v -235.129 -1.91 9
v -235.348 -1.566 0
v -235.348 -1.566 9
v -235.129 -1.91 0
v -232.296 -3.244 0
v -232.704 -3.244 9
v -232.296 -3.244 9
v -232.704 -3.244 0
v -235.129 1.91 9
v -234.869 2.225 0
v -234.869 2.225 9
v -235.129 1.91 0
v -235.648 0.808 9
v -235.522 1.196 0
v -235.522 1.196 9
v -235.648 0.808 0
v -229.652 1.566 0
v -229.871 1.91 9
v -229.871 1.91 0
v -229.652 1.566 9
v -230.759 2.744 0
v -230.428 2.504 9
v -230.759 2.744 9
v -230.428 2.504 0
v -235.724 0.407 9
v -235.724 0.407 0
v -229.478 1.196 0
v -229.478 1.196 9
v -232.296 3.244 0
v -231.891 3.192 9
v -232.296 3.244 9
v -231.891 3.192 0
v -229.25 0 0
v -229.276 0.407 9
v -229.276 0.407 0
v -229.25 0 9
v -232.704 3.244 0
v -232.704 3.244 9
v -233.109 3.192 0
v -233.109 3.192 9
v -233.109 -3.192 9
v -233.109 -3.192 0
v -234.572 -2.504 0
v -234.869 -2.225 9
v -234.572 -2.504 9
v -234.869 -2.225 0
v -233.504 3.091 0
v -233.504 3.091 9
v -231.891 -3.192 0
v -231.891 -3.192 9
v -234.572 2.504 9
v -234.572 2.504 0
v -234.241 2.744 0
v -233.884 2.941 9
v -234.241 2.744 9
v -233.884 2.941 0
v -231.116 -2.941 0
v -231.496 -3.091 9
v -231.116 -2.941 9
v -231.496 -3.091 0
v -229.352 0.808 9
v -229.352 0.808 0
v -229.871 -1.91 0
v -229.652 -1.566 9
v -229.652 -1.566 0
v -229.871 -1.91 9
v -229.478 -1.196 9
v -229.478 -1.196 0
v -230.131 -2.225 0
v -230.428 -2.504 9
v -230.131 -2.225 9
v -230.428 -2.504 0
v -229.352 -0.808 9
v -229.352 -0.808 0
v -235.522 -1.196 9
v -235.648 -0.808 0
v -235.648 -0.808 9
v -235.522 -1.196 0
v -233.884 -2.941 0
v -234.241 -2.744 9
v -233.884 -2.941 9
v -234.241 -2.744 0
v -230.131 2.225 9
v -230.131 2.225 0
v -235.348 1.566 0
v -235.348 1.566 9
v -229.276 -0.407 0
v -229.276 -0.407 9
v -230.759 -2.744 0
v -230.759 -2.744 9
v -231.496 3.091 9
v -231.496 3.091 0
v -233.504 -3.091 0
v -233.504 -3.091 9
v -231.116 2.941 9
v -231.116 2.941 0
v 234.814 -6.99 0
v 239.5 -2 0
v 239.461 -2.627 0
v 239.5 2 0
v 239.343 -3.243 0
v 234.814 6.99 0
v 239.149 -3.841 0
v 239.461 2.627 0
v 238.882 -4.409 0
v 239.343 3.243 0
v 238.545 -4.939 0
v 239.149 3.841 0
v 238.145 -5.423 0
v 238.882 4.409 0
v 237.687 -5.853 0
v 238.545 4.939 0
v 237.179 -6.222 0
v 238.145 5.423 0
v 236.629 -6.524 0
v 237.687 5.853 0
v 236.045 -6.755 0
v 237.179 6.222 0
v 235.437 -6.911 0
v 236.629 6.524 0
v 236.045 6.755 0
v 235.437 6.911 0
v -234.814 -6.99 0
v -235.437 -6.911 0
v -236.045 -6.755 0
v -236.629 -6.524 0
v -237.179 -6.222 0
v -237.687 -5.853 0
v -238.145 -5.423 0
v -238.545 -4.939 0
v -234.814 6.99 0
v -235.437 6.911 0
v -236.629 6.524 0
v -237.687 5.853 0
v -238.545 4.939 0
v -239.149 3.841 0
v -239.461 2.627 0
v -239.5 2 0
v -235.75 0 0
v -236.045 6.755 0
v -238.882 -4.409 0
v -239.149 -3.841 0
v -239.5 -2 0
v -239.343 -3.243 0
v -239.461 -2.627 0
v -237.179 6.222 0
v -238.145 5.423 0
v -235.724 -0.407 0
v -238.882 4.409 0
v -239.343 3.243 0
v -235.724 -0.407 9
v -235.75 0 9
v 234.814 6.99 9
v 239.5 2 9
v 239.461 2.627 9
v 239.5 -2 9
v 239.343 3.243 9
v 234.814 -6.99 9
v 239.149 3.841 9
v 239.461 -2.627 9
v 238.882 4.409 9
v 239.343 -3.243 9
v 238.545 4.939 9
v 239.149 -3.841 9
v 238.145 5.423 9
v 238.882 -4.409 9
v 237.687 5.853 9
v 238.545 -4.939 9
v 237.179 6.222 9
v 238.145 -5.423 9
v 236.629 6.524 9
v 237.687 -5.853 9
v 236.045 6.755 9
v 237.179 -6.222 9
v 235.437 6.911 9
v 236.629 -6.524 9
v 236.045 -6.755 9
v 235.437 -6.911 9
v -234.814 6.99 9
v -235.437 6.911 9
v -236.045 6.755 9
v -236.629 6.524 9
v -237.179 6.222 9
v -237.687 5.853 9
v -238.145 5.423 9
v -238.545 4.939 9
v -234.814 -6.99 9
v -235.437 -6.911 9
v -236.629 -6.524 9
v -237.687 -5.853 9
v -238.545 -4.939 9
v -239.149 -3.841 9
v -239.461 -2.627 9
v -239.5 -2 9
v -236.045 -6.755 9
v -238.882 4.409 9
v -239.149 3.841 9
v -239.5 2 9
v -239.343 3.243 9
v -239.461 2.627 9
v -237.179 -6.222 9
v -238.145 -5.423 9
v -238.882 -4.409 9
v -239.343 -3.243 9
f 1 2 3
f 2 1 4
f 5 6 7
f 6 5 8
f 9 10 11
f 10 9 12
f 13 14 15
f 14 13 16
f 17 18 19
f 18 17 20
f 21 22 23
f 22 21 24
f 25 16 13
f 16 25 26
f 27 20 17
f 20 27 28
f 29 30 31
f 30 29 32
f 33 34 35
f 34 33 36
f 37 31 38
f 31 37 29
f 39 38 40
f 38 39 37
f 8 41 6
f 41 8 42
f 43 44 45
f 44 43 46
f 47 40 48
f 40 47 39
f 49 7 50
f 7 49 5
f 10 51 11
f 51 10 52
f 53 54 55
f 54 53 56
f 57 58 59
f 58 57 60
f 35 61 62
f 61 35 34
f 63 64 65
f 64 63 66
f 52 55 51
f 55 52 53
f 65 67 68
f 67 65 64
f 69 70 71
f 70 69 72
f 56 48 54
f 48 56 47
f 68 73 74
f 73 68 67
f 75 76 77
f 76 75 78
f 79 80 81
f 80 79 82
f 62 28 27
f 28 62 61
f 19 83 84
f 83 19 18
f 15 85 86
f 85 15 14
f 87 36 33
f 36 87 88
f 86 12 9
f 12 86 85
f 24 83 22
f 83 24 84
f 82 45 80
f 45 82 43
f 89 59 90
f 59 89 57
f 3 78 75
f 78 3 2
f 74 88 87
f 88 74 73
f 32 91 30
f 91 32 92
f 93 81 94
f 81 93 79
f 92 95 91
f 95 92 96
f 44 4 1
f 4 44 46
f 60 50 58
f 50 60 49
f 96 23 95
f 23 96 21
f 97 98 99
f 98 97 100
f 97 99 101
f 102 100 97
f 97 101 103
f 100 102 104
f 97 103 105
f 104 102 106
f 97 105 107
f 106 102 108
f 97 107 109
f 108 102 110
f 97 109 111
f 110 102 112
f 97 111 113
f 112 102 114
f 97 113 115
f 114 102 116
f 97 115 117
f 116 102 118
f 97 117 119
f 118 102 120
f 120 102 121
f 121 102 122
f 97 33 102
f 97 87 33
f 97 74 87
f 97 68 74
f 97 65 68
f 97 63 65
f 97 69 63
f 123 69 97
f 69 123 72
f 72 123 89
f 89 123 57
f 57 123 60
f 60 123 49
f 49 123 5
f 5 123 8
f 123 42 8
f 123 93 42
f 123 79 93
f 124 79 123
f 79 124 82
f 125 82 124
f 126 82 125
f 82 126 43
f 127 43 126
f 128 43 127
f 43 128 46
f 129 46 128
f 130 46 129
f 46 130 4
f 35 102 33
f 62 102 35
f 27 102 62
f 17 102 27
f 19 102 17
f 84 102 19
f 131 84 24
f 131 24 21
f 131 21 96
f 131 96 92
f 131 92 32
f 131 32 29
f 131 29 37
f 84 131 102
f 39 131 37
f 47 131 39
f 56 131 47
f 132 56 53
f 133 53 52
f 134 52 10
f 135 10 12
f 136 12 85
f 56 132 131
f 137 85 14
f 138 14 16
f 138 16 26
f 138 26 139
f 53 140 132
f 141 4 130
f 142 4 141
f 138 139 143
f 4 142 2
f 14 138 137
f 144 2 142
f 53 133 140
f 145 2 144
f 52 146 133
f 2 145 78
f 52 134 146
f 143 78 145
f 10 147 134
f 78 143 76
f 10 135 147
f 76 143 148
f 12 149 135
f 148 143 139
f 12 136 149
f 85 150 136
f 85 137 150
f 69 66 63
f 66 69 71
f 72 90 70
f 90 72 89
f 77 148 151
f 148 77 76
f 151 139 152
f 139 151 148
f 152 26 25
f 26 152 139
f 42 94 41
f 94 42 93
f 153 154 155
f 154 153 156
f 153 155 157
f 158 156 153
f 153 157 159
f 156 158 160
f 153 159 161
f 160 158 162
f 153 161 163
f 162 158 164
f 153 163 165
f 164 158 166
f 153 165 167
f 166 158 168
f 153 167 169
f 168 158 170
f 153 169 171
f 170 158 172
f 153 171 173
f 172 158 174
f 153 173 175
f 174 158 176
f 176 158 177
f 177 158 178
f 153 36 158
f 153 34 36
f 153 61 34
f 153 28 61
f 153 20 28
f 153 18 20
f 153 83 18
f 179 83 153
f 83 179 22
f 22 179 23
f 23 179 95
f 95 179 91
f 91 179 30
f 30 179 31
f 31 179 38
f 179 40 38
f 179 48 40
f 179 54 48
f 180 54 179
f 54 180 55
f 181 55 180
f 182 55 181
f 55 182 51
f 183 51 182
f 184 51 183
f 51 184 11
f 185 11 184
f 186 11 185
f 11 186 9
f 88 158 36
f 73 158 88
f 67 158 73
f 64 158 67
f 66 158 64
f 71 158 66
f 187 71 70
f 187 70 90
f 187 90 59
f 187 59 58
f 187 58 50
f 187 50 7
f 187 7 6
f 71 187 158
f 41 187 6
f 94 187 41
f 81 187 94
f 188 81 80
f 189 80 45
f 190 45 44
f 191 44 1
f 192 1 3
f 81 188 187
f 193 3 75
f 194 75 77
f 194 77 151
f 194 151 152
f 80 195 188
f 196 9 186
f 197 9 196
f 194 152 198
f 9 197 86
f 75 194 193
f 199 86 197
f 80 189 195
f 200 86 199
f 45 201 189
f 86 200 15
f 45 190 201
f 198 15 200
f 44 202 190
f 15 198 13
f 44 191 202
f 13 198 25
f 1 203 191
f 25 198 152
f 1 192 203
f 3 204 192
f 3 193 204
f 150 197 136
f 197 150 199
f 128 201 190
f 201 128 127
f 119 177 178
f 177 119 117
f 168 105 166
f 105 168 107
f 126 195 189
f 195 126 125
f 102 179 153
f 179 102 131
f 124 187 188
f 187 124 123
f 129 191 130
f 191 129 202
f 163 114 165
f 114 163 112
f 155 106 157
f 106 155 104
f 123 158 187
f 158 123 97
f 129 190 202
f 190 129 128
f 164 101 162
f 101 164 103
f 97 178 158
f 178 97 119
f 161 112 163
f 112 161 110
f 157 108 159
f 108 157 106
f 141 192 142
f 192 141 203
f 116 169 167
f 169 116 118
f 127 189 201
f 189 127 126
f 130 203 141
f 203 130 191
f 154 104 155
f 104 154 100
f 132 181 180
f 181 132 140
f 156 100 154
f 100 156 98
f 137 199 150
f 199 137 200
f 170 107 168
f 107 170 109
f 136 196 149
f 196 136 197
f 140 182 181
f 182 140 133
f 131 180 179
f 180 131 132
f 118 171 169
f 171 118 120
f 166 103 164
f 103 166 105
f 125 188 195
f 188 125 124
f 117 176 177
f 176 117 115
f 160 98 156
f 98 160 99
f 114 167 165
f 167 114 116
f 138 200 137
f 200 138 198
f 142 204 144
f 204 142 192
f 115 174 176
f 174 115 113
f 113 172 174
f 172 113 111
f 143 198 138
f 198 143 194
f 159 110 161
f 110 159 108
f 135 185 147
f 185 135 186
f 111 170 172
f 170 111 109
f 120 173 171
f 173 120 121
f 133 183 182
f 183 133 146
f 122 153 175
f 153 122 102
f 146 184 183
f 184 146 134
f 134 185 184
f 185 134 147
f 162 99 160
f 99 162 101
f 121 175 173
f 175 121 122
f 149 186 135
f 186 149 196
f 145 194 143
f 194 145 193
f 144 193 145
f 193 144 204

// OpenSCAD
$fn = 50;


difference() {
	union() {
		hull() {
			translate(v = [-234.5000000000, 2.0000000000, 0]) {
				cylinder(h = 9, r = 5);
			}
			translate(v = [234.5000000000, 2.0000000000, 0]) {
				cylinder(h = 9, r = 5);
			}
			translate(v = [-234.5000000000, -2.0000000000, 0]) {
				cylinder(h = 9, r = 5);
			}
			translate(v = [234.5000000000, -2.0000000000, 0]) {
				cylinder(h = 9, r = 5);
			}
		}
	}
	union() {
		translate(v = [-232.5000000000, 0.0000000000, 0]) {
			cylinder(h = 9, r = 3.2500000000);
		}
		translate(v = [-232.5000000000, 0.0000000000, 0]) {
			cylinder(h = 9, r = 1.8000000000);
		}
		translate(v = [-232.5000000000, 0.0000000000, 0]) {
			cylinder(h = 9, r = 1.8000000000);
		}
		translate(v = [-232.5000000000, 0.0000000000, 0]) {
			cylinder(h = 9, r = 1.8000000000);
		}
	}
}
